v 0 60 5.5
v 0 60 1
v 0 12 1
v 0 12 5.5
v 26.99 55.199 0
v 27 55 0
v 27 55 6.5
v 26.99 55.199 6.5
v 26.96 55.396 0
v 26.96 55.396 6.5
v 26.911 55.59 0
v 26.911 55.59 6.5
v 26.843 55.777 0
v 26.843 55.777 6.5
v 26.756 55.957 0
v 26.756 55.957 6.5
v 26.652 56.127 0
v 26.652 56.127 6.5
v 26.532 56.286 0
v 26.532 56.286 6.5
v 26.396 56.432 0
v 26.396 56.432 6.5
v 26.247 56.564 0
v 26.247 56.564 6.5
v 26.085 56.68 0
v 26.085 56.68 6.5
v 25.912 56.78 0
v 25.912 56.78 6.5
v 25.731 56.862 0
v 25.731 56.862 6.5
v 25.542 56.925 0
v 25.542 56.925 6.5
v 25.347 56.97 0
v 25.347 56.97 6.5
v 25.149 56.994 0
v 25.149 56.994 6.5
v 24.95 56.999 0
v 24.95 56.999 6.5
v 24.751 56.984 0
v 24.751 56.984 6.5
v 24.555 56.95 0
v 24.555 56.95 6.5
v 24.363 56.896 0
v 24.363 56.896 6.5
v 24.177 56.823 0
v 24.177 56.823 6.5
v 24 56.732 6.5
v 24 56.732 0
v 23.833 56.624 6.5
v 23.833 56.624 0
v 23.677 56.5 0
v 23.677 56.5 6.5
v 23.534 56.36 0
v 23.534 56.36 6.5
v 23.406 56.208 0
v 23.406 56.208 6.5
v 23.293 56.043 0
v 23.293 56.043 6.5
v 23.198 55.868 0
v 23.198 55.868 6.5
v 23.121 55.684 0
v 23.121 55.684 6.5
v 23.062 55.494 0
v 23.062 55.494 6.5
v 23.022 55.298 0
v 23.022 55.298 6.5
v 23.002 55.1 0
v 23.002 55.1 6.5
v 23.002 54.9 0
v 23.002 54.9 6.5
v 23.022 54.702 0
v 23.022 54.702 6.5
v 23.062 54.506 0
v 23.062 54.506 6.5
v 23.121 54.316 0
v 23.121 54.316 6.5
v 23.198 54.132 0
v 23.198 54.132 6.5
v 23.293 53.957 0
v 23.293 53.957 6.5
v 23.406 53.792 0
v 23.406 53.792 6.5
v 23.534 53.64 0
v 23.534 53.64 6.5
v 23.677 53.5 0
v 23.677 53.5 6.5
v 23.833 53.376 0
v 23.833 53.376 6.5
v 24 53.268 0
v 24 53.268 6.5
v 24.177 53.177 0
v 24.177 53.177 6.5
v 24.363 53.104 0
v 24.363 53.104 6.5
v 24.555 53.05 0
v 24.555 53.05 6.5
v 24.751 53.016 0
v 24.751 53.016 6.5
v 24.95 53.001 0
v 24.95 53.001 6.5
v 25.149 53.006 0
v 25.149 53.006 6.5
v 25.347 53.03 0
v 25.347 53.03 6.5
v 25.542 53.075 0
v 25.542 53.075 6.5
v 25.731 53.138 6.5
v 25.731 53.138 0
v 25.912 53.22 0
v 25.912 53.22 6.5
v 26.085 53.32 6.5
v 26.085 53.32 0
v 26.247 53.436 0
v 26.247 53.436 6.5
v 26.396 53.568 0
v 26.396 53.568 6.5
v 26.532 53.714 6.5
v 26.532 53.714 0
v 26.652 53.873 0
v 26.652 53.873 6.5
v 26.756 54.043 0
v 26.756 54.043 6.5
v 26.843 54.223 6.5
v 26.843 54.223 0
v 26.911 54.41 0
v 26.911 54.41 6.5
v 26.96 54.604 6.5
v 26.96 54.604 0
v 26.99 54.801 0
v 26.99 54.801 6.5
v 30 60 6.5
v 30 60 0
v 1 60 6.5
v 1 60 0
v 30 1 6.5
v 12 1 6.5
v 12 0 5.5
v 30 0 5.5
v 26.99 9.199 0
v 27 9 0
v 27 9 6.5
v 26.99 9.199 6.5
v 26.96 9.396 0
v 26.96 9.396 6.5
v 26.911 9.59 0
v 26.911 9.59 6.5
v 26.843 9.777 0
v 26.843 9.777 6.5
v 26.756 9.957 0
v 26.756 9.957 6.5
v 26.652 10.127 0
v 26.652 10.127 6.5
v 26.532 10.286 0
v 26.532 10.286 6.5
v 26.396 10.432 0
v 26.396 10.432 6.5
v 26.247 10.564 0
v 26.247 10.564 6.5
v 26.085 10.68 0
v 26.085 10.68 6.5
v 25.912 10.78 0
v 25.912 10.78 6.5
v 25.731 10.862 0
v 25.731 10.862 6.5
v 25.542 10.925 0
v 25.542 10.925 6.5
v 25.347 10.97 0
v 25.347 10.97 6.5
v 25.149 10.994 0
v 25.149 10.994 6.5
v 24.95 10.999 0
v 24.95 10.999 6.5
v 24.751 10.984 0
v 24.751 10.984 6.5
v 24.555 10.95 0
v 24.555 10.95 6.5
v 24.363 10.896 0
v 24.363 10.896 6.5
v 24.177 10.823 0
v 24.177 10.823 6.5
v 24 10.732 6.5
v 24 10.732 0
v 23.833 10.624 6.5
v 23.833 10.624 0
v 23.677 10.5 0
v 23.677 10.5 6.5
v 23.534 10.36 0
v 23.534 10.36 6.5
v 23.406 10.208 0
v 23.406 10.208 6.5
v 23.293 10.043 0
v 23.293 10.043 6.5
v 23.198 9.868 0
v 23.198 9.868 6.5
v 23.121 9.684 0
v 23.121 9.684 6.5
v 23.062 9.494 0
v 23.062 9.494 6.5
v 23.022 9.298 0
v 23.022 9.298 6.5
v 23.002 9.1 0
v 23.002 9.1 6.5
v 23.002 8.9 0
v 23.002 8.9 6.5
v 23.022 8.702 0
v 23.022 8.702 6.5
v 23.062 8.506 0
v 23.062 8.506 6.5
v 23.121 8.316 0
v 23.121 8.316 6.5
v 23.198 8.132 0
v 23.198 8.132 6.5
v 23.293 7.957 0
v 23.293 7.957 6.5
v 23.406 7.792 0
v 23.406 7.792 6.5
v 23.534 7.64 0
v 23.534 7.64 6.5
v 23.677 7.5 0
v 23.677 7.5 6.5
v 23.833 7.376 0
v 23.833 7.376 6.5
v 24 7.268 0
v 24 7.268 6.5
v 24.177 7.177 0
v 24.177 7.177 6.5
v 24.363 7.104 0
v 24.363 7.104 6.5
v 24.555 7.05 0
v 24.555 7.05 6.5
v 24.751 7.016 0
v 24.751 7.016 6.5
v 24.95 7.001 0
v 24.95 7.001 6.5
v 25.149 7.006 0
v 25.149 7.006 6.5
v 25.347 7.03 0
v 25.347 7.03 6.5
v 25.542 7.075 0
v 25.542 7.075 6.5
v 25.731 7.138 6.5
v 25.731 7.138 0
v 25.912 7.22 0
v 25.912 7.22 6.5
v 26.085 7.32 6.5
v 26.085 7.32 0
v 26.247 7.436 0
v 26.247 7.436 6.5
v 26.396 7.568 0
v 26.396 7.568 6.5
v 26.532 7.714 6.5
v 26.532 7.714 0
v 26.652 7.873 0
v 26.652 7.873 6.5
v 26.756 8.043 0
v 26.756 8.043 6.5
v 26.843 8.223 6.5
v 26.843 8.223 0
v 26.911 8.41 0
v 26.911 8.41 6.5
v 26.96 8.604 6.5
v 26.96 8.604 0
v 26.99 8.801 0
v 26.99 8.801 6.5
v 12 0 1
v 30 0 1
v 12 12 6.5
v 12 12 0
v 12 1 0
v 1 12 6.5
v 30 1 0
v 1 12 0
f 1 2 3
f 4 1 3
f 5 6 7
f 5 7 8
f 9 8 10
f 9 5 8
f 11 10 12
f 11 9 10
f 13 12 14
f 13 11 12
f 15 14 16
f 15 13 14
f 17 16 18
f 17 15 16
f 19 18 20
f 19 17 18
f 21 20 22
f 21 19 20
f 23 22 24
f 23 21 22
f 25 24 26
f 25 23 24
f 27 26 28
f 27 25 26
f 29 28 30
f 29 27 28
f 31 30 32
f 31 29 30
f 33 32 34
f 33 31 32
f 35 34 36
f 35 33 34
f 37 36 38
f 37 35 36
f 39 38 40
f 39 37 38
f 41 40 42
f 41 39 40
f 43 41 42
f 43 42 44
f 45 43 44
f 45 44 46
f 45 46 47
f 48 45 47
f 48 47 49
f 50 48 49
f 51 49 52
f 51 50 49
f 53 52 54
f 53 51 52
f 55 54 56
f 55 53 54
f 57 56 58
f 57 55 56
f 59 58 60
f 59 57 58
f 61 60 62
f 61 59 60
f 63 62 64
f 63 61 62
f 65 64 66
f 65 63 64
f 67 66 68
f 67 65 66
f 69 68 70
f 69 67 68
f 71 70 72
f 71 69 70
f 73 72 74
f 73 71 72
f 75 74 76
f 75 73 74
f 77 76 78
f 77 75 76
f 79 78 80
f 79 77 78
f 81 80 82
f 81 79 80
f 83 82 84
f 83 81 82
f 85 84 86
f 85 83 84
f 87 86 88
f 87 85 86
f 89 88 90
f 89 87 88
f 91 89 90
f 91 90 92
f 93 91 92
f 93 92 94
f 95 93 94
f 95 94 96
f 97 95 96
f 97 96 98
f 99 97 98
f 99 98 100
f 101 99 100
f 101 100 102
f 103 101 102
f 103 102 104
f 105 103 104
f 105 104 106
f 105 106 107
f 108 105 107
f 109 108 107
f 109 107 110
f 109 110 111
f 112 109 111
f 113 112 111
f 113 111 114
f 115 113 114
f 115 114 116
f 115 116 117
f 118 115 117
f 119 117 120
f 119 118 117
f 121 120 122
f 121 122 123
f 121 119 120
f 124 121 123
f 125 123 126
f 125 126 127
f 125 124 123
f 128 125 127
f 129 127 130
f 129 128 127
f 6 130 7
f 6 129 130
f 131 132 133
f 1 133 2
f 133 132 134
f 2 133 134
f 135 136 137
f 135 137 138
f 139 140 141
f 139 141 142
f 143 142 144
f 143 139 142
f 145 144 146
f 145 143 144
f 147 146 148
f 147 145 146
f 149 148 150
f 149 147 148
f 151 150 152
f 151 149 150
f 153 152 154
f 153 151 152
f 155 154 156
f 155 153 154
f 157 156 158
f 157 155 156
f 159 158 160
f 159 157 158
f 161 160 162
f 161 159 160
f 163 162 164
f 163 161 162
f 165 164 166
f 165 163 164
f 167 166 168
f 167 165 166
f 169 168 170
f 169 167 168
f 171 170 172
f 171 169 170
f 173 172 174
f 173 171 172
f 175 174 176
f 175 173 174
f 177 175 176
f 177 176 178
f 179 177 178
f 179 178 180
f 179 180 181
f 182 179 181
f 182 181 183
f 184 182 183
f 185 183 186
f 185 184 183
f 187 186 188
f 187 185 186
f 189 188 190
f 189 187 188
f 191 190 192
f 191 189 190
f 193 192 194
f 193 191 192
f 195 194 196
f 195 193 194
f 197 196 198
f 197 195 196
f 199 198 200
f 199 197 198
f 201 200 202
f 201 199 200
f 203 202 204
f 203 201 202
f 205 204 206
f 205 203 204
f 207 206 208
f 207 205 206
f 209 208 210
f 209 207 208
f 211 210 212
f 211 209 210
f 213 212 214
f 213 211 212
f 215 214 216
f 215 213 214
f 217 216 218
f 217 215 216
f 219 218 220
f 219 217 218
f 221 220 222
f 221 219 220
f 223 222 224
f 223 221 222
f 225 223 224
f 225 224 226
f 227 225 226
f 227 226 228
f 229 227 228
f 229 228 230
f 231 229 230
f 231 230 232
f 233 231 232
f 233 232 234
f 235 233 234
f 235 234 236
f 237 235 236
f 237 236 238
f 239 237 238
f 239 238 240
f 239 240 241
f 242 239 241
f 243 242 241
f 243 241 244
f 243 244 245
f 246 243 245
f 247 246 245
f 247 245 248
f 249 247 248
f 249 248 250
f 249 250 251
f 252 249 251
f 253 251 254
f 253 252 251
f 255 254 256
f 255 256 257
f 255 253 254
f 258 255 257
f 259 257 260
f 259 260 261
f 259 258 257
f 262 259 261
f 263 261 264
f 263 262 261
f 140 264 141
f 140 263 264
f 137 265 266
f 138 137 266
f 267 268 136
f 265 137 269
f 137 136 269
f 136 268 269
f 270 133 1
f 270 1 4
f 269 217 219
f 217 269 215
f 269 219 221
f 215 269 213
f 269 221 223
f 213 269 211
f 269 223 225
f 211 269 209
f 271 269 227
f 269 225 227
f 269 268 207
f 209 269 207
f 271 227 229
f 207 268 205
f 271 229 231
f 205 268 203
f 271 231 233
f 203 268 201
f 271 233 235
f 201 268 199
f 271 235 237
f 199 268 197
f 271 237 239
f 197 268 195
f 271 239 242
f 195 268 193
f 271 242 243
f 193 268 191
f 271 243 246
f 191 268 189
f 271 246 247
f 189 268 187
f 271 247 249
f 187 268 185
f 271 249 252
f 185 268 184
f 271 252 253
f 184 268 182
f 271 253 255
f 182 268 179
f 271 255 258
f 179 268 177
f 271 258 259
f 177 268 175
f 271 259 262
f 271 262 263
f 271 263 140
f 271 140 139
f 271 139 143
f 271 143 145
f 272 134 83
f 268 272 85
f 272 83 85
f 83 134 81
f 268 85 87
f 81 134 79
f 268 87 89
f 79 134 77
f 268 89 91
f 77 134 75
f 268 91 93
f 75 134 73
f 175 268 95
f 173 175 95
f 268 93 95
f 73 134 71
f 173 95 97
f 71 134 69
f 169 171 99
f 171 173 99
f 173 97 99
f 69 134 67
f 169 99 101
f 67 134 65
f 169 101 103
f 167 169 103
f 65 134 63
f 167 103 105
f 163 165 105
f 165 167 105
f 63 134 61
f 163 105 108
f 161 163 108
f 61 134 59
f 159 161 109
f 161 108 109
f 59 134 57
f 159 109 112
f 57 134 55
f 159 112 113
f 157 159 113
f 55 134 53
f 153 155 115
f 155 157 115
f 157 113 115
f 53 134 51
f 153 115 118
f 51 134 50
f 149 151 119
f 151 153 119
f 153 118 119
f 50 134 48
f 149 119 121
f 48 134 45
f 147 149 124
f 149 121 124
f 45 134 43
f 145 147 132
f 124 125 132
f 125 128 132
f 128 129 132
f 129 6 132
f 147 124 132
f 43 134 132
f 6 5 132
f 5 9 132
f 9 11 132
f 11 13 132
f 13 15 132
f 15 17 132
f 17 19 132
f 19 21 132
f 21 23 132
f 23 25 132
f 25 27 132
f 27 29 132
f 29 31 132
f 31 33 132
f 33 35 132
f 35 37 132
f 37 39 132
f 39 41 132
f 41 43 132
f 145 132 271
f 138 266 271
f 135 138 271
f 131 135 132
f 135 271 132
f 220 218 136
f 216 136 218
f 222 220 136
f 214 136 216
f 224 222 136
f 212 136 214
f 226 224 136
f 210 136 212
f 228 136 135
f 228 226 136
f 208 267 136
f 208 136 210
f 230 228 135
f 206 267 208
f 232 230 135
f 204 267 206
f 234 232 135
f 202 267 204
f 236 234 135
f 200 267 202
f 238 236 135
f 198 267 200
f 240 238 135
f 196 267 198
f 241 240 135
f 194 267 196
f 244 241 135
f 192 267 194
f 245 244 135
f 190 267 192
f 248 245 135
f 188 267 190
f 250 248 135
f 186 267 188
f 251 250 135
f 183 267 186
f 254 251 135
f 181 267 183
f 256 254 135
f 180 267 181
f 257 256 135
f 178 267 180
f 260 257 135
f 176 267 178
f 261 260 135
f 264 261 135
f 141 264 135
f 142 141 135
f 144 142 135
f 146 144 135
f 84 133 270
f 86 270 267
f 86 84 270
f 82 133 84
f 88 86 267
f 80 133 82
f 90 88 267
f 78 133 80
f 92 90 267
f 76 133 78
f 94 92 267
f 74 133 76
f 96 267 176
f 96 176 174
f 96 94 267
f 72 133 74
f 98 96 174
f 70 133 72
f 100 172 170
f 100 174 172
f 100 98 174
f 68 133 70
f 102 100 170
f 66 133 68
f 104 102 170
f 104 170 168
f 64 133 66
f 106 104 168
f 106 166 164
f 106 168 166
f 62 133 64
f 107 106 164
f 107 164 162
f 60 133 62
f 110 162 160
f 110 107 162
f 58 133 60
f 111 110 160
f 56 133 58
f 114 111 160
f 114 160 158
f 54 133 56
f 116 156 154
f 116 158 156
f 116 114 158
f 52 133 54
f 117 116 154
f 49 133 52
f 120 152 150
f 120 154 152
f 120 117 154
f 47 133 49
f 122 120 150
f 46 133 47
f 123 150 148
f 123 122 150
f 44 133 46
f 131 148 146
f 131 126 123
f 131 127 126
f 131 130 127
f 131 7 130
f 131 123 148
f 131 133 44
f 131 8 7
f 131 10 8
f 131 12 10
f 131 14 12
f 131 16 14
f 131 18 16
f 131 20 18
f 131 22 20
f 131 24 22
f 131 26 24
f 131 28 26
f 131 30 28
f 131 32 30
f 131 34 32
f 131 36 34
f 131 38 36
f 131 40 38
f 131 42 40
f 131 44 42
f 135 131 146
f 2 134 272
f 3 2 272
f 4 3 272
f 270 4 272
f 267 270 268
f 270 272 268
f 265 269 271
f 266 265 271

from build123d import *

# Parameters (mm, degrees)
F0_R     = 2
F1_DEPTH = 6.5
F2_SIZE  = 1


# Not quite as in the source:
# - a feature names something its author has since deleted; it is built from what else it names


with BuildPart() as f1:
    # F0 (on Top) → F1 (new body)
    with BuildSketch(Plane.XY):
        Polygon((12, 12), (12, 0), (30, 0), (30, 60), (0, 60), (0, 12), align=None)
        with Locations((25, 9)):
            Circle(F0_R, mode=Mode.SUBTRACT)
        with Locations((25, 55)):
            Circle(F0_R, mode=Mode.SUBTRACT)
    extrude(amount=F1_DEPTH)

    # F2
    f2_edges = [f1.edges().sort_by_distance(p)[0] for p in [
        (21, 0, 0),
        (21, 0, 6.5),
        (0, 36, 0),
        (0, 36, 6.5),
    ]]
    chamfer(f2_edges, length=F2_SIZE)


solid = f1.part
